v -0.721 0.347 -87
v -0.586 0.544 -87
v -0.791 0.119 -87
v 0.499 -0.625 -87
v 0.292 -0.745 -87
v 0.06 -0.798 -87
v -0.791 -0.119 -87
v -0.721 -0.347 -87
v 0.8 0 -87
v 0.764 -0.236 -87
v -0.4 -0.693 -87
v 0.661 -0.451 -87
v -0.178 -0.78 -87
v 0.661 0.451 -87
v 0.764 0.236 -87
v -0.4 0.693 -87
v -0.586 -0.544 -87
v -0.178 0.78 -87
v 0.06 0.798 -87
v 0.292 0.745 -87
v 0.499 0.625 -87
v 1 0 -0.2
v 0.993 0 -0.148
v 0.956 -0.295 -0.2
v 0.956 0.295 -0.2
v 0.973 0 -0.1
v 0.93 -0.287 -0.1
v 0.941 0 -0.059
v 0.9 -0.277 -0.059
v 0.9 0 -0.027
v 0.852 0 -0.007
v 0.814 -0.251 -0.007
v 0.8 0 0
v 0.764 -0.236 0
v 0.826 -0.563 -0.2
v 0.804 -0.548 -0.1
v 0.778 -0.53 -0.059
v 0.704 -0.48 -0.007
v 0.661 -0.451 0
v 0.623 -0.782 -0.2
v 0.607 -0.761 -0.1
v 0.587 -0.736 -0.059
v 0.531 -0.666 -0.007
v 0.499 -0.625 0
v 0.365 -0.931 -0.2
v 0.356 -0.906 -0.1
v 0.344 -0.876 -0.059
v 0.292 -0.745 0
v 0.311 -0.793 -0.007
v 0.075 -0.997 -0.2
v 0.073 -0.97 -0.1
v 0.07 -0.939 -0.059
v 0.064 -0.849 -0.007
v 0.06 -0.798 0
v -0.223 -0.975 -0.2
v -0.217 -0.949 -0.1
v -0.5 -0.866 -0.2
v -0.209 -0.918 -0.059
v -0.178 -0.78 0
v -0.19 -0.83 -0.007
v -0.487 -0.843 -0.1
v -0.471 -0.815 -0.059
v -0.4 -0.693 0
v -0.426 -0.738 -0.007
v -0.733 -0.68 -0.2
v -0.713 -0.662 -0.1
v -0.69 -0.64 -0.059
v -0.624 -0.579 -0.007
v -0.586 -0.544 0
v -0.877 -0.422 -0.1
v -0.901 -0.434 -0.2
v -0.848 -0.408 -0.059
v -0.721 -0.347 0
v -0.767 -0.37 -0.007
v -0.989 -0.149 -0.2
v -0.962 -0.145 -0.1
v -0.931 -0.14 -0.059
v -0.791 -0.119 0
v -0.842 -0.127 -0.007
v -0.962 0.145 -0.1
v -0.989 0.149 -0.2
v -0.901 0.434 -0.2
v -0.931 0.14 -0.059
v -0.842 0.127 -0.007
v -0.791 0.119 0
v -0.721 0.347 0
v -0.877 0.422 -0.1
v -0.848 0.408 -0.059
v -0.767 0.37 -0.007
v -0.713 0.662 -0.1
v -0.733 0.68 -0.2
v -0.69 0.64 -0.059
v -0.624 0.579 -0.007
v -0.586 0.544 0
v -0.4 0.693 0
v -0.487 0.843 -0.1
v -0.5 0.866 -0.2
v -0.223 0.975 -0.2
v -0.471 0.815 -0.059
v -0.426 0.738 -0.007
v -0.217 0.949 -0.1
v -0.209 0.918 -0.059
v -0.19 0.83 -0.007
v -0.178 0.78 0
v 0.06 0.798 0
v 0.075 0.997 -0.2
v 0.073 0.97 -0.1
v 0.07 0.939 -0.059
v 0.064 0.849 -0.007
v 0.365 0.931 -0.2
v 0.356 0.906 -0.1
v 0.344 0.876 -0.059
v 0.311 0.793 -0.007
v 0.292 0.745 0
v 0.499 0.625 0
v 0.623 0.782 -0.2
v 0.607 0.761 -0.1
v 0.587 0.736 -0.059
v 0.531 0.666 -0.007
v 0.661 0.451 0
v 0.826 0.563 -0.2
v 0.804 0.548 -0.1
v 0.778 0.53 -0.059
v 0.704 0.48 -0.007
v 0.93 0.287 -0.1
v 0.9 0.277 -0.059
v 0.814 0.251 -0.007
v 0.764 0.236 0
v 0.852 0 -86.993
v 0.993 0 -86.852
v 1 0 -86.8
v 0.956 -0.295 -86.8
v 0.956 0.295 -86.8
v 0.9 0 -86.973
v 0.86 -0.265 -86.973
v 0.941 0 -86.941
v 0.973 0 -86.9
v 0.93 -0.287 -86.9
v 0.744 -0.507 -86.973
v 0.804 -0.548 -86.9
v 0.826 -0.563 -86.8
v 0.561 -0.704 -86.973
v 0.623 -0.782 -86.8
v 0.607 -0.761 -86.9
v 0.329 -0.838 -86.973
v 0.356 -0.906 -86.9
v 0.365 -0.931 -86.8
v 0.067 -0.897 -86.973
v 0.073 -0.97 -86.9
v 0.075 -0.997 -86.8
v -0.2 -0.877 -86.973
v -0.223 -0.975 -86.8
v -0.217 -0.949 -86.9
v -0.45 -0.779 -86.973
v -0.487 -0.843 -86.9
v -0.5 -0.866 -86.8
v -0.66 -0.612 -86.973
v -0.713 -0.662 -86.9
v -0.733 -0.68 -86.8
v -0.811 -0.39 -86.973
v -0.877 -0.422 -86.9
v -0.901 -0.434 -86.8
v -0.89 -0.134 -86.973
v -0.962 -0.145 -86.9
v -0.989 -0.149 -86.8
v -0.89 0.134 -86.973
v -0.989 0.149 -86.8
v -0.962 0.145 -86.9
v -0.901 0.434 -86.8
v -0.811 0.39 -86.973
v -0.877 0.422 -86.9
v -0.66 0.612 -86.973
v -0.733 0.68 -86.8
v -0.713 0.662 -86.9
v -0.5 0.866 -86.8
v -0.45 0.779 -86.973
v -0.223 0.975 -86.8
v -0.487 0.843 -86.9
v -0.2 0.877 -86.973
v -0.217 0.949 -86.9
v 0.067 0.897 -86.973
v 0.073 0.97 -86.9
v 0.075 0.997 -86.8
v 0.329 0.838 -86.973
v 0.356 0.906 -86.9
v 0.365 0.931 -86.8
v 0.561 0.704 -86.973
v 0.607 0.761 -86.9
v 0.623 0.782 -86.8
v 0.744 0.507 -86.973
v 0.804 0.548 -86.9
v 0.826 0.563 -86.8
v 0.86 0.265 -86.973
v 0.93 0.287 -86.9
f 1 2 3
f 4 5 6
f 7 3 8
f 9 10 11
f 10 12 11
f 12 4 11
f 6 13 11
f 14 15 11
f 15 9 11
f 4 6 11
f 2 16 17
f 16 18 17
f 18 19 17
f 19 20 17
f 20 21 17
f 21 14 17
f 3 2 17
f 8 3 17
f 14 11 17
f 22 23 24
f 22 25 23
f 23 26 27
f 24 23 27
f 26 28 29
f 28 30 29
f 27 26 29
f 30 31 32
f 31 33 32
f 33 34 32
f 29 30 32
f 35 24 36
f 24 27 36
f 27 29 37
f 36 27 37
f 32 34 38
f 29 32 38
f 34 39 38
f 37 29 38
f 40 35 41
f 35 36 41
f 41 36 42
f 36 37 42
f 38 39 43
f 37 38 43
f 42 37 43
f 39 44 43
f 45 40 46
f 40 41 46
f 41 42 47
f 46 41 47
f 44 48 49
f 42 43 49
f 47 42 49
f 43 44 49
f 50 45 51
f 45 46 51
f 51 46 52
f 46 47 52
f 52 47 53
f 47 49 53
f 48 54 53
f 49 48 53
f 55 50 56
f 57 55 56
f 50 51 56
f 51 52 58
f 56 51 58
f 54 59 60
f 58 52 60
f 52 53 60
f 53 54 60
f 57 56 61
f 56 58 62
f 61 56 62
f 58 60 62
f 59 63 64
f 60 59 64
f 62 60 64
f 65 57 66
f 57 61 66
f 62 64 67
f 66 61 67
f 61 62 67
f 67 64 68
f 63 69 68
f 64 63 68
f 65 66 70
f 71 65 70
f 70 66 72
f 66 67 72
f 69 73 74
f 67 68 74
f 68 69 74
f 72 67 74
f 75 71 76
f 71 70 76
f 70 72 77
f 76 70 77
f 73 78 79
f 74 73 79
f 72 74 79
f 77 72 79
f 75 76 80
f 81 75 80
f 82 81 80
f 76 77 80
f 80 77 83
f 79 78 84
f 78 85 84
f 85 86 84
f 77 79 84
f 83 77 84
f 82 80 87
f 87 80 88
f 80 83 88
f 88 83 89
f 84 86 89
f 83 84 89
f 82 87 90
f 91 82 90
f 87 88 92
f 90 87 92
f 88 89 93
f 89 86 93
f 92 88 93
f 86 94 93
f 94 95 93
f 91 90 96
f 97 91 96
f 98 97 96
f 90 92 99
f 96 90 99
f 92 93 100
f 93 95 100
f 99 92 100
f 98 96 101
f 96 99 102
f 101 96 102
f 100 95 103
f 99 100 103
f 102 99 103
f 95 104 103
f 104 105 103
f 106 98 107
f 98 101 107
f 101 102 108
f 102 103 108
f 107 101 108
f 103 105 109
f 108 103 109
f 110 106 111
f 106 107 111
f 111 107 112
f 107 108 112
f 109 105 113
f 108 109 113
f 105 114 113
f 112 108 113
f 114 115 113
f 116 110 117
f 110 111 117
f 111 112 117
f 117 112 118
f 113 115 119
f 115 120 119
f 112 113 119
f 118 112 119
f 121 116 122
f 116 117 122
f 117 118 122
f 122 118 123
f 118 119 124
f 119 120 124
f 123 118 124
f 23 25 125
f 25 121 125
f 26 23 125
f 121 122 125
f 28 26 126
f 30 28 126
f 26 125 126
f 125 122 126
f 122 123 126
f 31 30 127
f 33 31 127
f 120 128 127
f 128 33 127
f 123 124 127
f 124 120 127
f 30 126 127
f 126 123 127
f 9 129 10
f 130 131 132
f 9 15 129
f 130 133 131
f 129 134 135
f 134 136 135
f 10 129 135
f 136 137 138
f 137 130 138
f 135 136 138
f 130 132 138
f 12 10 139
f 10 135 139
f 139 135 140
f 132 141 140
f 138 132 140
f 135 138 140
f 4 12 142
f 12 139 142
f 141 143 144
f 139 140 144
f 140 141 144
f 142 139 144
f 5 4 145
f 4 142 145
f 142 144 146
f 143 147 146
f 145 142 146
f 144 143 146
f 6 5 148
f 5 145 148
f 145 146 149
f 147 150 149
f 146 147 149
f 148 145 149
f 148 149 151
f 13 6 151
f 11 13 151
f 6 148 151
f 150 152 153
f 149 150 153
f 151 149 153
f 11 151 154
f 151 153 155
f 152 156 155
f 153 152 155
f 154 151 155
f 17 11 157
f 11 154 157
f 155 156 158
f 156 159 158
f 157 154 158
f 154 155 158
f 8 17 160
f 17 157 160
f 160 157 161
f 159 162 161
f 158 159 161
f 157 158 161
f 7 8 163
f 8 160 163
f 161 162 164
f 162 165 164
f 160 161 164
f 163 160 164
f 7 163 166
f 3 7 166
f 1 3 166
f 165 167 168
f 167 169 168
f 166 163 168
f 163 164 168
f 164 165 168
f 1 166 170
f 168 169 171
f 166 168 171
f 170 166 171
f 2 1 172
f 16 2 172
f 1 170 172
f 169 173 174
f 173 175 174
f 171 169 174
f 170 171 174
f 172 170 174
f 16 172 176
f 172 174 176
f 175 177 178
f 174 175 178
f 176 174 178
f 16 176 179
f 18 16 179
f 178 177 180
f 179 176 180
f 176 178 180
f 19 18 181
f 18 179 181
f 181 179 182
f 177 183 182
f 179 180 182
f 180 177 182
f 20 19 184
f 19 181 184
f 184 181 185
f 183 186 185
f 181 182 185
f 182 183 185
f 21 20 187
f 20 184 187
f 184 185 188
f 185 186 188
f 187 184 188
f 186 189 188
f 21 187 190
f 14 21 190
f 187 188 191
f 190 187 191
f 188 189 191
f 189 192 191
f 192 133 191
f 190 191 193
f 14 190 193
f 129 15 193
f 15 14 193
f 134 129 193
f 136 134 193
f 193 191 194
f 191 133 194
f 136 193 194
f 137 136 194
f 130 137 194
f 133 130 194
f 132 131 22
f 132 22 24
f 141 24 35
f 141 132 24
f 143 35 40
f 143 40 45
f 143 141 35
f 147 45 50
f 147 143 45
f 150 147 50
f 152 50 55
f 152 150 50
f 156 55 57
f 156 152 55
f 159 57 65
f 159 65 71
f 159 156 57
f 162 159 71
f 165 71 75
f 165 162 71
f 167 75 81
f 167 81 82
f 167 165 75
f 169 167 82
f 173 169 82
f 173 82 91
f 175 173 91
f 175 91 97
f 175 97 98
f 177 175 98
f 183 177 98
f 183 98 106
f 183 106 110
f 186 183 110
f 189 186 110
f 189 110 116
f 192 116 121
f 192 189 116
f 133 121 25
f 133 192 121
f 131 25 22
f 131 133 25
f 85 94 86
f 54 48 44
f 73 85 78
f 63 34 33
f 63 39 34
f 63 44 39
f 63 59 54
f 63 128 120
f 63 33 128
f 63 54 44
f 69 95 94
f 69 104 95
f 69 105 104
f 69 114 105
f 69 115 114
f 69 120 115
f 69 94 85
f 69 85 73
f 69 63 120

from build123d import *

# Parameters (mm, degrees)
ESQUISSE1_W = 87
ESQUISSE1_H = 1
CONG_1_R    = 0.2
CONG_2_R    = 0.2


with BuildPart() as part:
    # Esquisse1 → Révolution1 (revolve)
    with BuildSketch(Plane(origin=(0, 0, 0), x_dir=(0, 0, -1), z_dir=(1, 0, 0)), mode=Mode.PRIVATE) as r_volution1_sk:
        with Locations((43.5, 0.5)):
            Rectangle(ESQUISSE1_W, ESQUISSE1_H)
    revolve(r_volution1_sk.sketch.rotate(Axis((0, 0, 0), (0, 0, -1)), 90), axis=Axis((0, 0, 0), (0, 0, -1)))

    # Congé1
    cong_1_edges = [part.edges().sort_by_distance(p)[0] for p in [
        (-1, 0, -87),
    ]]
    fillet(cong_1_edges, radius=CONG_1_R)

    # Congé2
    cong_2_edges = [part.edges().sort_by_distance(p)[0] for p in [
        (-1, 0, 0),
    ]]
    fillet(cong_2_edges, radius=CONG_2_R)


solid = part.part
